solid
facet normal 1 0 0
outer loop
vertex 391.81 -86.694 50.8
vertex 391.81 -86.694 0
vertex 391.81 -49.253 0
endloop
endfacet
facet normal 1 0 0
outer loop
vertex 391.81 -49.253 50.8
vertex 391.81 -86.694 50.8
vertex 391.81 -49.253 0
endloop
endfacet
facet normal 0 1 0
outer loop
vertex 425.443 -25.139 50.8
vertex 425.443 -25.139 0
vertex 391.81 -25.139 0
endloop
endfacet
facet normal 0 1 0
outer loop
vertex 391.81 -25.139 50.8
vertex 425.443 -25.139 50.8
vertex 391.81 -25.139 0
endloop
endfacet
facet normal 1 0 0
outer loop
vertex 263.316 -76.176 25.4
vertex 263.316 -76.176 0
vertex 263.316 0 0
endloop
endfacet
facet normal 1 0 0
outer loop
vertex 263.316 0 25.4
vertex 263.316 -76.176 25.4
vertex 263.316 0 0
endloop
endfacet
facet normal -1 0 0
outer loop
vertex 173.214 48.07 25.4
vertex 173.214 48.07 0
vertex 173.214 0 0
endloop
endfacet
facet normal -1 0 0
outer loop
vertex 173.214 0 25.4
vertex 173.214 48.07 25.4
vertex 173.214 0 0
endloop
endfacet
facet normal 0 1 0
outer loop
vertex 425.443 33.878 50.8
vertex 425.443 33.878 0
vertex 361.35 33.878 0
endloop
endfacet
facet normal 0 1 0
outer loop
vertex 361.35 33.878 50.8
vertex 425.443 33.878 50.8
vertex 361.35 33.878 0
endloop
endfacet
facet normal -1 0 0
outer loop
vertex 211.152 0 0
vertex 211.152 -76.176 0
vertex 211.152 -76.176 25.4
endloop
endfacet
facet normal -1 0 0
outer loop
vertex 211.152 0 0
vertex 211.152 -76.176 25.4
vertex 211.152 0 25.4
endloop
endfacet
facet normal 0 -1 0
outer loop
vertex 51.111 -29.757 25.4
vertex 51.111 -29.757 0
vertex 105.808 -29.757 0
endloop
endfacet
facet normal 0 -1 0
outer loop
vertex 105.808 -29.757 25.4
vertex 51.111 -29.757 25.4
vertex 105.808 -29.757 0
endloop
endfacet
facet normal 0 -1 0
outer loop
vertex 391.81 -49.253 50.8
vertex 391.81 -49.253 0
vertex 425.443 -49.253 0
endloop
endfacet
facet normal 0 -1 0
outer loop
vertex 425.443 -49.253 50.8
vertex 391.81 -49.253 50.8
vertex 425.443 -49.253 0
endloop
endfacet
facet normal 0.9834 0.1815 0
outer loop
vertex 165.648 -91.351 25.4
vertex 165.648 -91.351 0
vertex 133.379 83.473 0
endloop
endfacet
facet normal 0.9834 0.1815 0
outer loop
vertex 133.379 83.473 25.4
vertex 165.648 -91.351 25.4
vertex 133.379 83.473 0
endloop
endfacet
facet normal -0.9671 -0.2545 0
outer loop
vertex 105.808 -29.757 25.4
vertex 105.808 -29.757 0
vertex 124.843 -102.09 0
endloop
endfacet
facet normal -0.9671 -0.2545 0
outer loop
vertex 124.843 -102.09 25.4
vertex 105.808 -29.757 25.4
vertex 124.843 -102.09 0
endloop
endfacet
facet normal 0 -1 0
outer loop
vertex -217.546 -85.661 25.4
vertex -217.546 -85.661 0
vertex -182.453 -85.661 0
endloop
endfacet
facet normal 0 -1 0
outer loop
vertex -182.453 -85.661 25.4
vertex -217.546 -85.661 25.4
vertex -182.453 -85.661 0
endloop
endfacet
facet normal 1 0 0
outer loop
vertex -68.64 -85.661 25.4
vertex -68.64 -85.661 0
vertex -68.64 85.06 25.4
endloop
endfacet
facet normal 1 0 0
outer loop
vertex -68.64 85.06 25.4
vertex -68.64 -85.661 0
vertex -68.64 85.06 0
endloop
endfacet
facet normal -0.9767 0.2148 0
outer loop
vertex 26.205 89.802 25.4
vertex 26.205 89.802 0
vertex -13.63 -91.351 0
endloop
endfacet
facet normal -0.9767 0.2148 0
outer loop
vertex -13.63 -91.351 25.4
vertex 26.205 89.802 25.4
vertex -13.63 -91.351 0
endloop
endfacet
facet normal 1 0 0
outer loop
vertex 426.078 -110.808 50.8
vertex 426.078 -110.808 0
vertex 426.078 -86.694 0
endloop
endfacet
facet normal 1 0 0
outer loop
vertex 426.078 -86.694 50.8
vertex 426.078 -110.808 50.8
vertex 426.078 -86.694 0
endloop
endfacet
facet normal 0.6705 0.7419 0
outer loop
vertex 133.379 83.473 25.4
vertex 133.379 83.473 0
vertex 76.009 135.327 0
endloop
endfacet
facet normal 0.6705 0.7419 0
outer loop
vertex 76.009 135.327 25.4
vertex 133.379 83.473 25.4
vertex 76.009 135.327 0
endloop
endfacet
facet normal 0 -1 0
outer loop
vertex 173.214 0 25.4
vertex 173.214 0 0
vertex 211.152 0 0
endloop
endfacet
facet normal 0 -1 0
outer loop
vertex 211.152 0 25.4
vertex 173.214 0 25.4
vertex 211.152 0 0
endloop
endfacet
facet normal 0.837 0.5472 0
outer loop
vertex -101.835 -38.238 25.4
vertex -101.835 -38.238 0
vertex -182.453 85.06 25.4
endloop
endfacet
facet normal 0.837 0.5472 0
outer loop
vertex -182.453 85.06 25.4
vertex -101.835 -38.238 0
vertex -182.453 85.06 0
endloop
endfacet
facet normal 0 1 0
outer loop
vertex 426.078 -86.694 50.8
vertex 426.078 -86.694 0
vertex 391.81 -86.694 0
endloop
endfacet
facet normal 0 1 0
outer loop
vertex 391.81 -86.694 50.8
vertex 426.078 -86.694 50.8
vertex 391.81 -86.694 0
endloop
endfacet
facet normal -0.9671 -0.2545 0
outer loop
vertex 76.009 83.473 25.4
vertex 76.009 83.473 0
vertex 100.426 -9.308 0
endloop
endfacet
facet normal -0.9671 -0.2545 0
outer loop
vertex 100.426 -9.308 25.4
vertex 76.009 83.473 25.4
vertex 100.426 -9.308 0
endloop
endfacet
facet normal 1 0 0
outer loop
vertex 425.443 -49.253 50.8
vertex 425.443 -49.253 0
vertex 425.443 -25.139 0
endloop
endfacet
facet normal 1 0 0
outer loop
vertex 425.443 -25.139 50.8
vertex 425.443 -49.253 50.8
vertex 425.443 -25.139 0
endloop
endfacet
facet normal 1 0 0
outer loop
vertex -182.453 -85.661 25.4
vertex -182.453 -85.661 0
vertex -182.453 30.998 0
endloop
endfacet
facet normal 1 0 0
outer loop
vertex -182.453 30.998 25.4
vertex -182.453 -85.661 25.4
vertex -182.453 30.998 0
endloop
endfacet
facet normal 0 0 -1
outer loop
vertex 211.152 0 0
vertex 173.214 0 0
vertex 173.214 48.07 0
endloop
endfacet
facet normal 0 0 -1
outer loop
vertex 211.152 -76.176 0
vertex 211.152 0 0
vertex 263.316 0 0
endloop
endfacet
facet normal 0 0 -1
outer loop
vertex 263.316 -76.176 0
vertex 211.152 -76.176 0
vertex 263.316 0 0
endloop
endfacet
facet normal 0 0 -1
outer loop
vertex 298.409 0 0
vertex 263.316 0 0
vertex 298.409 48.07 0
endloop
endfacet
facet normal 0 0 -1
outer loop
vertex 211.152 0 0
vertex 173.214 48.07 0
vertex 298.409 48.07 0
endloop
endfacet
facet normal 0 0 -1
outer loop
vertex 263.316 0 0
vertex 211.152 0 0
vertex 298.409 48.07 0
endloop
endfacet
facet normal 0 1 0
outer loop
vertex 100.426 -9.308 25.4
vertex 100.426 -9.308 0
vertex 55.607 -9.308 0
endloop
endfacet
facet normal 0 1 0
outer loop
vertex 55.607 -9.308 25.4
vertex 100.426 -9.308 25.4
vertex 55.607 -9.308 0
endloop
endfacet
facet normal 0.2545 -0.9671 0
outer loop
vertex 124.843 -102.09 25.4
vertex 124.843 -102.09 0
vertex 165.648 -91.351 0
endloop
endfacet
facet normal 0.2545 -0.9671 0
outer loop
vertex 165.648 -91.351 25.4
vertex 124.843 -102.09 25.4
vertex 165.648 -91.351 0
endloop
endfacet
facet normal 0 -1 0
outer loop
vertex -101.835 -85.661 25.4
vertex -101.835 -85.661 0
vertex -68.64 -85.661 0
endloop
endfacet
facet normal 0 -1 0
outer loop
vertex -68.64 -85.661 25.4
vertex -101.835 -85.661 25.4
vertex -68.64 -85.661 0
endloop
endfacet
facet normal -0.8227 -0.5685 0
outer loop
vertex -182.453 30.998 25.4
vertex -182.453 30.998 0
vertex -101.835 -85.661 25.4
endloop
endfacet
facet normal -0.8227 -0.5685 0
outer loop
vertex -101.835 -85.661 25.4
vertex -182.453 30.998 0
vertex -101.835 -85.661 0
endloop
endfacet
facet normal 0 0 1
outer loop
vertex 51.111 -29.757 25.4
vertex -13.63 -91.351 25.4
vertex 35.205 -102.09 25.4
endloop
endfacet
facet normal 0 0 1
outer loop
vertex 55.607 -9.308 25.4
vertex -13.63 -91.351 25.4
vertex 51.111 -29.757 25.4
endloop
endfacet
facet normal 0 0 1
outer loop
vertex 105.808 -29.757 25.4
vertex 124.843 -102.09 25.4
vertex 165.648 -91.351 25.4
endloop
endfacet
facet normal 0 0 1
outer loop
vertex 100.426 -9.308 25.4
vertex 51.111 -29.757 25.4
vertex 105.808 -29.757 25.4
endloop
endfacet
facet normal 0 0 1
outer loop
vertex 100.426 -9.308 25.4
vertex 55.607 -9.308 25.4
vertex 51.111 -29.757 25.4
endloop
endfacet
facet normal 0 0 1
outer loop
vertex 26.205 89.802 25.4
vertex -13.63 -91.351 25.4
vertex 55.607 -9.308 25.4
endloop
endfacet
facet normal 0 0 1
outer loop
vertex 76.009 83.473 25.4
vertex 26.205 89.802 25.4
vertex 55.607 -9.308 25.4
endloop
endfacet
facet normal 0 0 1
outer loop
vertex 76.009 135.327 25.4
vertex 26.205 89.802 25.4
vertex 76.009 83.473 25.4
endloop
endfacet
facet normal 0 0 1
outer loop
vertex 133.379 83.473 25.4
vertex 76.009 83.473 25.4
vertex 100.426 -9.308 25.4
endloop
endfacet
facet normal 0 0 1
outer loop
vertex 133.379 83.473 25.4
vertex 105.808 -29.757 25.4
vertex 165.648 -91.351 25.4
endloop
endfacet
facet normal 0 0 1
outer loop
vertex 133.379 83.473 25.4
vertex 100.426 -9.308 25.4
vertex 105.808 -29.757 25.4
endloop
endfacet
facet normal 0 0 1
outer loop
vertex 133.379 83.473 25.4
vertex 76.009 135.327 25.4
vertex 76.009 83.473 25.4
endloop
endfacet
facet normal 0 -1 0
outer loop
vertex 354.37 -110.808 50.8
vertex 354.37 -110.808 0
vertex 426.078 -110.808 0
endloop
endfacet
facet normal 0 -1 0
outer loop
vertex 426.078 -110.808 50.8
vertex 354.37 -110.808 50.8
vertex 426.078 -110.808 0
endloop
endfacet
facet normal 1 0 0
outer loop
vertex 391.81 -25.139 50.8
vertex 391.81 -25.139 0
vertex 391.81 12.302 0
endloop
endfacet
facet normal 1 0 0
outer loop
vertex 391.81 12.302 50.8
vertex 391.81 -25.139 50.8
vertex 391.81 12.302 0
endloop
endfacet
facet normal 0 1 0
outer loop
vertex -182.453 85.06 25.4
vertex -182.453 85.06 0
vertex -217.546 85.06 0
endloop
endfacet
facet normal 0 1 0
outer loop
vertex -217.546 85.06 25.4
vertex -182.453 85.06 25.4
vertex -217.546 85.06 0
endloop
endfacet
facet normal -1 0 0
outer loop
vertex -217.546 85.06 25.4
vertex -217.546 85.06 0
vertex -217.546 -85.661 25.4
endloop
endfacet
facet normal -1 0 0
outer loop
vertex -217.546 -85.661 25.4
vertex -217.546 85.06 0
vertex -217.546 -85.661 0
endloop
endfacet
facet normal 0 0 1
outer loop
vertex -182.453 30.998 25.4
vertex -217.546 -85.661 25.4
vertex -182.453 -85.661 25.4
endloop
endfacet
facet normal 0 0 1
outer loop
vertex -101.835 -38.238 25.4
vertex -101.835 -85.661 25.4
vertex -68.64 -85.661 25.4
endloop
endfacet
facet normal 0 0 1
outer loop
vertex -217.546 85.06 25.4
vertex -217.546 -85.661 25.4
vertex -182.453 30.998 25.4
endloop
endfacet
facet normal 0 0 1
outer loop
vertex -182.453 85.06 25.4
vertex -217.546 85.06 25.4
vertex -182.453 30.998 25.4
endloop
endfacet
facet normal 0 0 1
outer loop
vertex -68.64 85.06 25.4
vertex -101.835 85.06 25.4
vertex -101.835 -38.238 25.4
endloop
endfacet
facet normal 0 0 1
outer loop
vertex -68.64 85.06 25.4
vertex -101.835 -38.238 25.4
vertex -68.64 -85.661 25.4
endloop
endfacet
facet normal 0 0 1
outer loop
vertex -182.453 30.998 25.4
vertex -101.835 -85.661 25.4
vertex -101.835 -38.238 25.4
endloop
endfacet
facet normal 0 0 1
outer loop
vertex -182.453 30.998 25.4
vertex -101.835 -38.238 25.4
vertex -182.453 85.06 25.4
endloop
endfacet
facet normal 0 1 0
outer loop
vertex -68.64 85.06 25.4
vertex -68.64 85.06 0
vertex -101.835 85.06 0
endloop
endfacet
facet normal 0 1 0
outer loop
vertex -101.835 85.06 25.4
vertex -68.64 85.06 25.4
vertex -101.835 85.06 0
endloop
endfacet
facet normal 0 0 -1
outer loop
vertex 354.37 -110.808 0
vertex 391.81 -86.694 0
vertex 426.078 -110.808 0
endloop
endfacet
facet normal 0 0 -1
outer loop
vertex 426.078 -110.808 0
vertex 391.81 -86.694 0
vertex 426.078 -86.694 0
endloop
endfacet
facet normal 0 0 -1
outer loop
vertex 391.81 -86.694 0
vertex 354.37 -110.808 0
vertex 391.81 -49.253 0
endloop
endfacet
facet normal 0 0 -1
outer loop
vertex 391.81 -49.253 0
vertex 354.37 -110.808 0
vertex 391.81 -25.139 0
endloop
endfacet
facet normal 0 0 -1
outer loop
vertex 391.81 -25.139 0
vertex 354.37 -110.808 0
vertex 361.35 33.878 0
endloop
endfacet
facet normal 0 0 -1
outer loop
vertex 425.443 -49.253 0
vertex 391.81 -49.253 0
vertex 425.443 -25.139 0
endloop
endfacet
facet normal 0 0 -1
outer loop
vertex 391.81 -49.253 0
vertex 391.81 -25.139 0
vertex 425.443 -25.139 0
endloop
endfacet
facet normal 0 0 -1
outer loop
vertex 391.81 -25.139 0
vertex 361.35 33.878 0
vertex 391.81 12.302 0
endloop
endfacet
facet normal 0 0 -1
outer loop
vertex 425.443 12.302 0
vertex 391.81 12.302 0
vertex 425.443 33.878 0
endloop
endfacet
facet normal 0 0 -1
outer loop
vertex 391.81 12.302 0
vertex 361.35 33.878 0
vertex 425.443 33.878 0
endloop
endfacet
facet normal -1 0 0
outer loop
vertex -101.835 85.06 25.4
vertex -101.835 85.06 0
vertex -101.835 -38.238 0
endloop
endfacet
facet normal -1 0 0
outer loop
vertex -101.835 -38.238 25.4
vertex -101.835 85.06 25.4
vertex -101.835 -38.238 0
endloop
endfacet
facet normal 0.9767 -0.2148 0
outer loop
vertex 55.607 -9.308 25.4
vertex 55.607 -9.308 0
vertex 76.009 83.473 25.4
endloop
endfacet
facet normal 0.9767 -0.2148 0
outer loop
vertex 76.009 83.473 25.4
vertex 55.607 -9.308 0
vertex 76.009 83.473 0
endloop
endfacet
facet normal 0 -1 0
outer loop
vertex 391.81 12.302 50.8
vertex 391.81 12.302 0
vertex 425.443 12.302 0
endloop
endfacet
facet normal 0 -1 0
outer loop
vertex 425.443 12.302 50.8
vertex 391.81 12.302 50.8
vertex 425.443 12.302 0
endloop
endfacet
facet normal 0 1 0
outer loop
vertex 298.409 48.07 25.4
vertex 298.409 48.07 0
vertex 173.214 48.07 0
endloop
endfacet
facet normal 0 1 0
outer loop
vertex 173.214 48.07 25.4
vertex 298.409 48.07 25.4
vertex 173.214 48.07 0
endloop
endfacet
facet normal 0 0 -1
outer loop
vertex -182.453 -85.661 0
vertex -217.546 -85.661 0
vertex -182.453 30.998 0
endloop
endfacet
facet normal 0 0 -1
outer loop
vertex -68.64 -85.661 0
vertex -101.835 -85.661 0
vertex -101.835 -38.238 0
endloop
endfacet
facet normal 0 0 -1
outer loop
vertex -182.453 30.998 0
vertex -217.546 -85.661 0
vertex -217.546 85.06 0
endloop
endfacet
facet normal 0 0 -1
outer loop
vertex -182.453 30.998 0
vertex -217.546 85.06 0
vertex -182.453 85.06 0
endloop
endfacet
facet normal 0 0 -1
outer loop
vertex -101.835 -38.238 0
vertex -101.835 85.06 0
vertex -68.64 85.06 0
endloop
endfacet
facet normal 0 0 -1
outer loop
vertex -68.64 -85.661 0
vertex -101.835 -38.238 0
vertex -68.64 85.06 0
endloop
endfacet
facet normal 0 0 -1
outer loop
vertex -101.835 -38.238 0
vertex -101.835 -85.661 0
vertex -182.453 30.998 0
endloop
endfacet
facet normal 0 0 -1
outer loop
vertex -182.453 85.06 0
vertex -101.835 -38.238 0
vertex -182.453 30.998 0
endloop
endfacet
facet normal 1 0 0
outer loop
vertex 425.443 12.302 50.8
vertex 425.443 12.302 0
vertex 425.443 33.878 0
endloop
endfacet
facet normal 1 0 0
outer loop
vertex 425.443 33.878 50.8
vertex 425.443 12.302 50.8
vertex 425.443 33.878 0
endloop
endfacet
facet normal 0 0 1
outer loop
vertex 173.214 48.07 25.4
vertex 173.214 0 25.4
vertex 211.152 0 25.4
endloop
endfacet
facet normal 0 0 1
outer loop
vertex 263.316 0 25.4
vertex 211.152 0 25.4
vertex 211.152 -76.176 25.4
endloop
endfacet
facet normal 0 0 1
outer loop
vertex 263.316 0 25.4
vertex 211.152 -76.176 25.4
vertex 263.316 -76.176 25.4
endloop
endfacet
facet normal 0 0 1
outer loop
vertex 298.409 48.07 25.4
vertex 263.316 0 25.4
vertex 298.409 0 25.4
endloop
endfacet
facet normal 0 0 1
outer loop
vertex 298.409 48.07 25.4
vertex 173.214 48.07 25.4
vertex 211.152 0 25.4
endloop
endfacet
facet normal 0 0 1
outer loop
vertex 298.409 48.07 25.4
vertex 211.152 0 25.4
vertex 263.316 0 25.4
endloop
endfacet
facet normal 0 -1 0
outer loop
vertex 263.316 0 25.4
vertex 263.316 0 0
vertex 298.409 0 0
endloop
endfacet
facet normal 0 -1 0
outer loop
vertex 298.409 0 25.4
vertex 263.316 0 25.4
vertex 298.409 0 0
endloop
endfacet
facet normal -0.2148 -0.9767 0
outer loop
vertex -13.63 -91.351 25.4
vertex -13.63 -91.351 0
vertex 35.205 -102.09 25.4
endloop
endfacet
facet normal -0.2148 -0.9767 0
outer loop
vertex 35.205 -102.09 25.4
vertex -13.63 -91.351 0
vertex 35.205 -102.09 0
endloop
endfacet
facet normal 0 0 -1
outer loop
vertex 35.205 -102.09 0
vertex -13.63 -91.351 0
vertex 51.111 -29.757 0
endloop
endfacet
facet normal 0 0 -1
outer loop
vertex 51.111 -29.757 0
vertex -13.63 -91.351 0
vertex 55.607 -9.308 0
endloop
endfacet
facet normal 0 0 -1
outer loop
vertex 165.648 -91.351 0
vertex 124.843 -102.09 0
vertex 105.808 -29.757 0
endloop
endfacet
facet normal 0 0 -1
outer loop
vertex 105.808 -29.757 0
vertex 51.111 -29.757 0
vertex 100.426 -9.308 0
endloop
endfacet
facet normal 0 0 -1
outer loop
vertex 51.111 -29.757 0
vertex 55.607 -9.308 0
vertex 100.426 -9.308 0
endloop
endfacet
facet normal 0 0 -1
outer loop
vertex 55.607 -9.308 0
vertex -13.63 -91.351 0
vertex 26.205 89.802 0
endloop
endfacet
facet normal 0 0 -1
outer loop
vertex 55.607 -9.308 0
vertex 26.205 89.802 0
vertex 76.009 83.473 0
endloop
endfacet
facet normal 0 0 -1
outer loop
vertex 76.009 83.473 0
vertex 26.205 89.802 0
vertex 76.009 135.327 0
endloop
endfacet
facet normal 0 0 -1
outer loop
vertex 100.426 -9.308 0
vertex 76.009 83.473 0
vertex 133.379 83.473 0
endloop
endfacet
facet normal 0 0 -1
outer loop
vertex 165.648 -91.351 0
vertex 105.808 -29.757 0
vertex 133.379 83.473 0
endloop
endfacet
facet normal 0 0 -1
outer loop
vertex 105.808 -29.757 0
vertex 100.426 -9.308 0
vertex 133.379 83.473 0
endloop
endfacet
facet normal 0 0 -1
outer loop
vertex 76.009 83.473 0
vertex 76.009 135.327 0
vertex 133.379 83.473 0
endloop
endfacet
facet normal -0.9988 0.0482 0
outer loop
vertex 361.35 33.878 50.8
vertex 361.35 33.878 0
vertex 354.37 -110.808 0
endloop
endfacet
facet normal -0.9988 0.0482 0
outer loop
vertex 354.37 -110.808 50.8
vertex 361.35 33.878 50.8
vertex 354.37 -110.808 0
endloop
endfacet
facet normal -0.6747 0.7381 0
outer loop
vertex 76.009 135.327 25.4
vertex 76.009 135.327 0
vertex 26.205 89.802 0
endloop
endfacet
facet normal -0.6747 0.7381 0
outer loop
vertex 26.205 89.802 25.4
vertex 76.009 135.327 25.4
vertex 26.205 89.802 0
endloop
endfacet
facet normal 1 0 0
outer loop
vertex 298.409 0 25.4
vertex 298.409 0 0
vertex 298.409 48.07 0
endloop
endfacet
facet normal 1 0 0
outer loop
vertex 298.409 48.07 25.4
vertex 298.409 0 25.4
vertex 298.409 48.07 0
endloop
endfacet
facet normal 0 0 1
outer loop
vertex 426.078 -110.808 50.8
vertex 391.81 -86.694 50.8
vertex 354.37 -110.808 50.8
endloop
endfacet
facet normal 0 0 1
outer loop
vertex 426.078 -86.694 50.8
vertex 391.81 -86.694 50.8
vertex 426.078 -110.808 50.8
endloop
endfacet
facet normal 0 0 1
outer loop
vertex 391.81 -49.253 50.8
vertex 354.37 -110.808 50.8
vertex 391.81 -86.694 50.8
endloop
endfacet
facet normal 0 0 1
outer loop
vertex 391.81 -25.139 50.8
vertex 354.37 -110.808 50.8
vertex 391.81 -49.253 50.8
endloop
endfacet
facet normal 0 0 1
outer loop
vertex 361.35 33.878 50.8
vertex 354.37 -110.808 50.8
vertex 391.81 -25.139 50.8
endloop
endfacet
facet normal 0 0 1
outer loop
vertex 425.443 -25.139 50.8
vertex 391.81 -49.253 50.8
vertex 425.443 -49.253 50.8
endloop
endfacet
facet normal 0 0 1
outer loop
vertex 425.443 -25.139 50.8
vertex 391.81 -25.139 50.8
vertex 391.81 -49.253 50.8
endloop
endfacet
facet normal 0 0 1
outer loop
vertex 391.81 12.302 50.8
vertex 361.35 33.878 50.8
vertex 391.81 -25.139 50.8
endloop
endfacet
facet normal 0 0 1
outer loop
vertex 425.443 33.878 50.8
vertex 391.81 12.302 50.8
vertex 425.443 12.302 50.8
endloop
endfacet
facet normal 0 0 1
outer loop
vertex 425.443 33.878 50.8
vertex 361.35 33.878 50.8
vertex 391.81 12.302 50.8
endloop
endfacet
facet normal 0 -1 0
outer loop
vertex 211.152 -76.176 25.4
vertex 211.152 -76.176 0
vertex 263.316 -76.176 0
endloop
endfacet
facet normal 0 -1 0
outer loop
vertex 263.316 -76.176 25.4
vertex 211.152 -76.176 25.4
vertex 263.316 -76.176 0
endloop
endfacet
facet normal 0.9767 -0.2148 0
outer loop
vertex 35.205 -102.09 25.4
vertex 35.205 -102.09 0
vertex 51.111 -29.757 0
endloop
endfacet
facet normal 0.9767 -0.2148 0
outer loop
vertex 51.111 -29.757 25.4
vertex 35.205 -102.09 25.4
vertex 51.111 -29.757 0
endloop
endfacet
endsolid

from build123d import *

# Parameters (mm, degrees)
F1_DEPTH  = 25.4
F0_W      = 52.1645247936
F0_H      = 76.1762037873
F0_W_2    = 114.7619485855
F0_H_2    = 76.8241360784
F3_DEPTH  = 50.8
F4_W      = 31.2986969948
F4_H      = 23.7111561
F5_DEPTH  = 50.8
F6_DEPTH  = 25.4
F7_DEPTH  = 25.4
F8_DEPTH  = 25.4
F9_DEPTH  = 25.4
F10_DEPTH = 25.4
F12_DEPTH = 50.8


with BuildPart() as f1:
    # F0 (on Top) → F1 (new body)
    with BuildSketch(Plane.XY):
        Polygon((-182.453379035, 85.0596278906), (-217.5458818674, 85.0596278906), (-217.5458818674, -85.6606662273), (-182.453379035, -85.6606662273), (-182.453379035, 30.998211354), align=None)
        Polygon((-101.8354520202, -38.2383577526), (-182.453379035, 85.0596278906), (-182.453379035, 30.998211354), (-101.8354520202, -85.6606662273), align=None)
        Polygon((-101.8354520202, 85.0596502423), (-101.8354520202, -38.2383577526), (-101.8354520202, -85.6606662273), (-68.639844656, -85.6606662273), (-68.639844656, 85.0596502423), align=None)
    extrude(amount=F1_DEPTH)


with BuildPart() as f1b:
    # F0 (on Top) → F1, piece 2 (new body)
    with BuildSketch(Plane.XY):
        Polygon((76.009353229, 135.3272944689), (26.2047741562, 89.8018702865), (-13.6299645528, -91.3513377309), (35.2049136263, -102.0898978339), (51.1106868903, -29.7565037626), (55.6071334276, -9.3083788014), (76.009353229, 83.4731402312), (100.426262979, -9.3083788014), (105.807507293, -29.7565037626), (124.843172729, -102.0898978339), (165.6484969401, -91.3513377309), (133.3791911602, 83.4731402312), align=None)
        Polygon((55.6071334276, -9.3083788014), (51.1106868903, -29.7565037626), (105.807507293, -29.7565037626), (100.426262979, -9.3083788014), align=None)
    extrude(amount=F1_DEPTH)


with BuildPart() as f1c:
    # F0 (on Top) → F1, piece 3 (new body)
    with BuildSketch(Plane.XY):
        with Locations((237.2340410948, -38.0881018937)):
            Rectangle(F0_W, F0_H)
        Polygon((173.2139289379, 0), (211.151778698, 0), (263.3163034916, 0), (298.408806324, 0), (298.408806324, 48.0702407658), (213.9971107244, 48.0702407658), (173.2139289379, 48.0702407658), align=None)
    extrude(amount=F1_DEPTH)


with BuildPart() as f1d:
    # F0 (on Top) → F1, piece 4 (new body)
    with BuildSketch(Plane.XY):
        with Locations((428.8201630116, 76.9978500903)):
            Rectangle(F0_W_2, F0_H_2)
    extrude(amount=F1_DEPTH)

    # F4 (on face) → F5 (cut)
    with BuildSketch(Plane.XY.offset(25.4)):
        with Locations((433.5623979568, 72.2556207329)):
            Rectangle(F4_W, F4_H)
    extrude(amount=-F5_DEPTH, mode=Mode.SUBTRACT)

    # F10 (cut): a face of the model
    f10_faces = [f1d.faces().sort_by_distance(p)[0] for p in [
        (372.820211989, 76.9978500903, 25.4),
    ]]
    extrude(f10_faces, amount=-F10_DEPTH, mode=Mode.SUBTRACT)


with BuildPart() as f3:
    # F2 (on face) → F3 (new body)
    with BuildSketch(Plane.XY.offset(25.4)):
        Polygon((395.150333643, 38.5857820511), (371.4391887188, 38.5857820511), (371.4391887188, -18.3209888637), (487.1495962143, -18.3209888637), (487.1495962143, 0), (395.150333643, 0), align=None)
    extrude(amount=F3_DEPTH)

    # F6 (cut): a face of the model
    f6_faces = [f3.faces().sort_by_distance(p)[0] for p in [
        (383.2947611809, 38.5857820511, 50.8),
    ]]
    extrude(f6_faces, amount=-F6_DEPTH, mode=Mode.SUBTRACT)

    # F7 (cut): a face of the model
    f7_faces = [f3.faces().sort_by_distance(p)[0] for p in [
        (383.2947611809, 13.1857820511, 50.8),
    ]]
    extrude(f7_faces, amount=-F7_DEPTH, mode=Mode.SUBTRACT)

    # F8 (cut): a face of the model
    f8_faces = [f3.faces().sort_by_distance(p)[0] for p in [
        (441.1499649286, 0, 50.8),
    ]]
    extrude(f8_faces, amount=-F8_DEPTH, mode=Mode.SUBTRACT)

    # F9 (cut): a face of the model
    f9_faces = [f3.faces().sort_by_distance(p)[0] for p in [
        (383.2947611809, -12.2142179489, 50.8),
    ]]
    extrude(f9_faces, amount=-F9_DEPTH, mode=Mode.SUBTRACT)


with BuildPart() as f12:
    # F11 (on Top) → F12 (new body)
    with BuildSketch(Plane.XY):
        Polygon((425.4434108734, 33.8778495789), (361.3499701023, 33.8778495789), (354.3695211411, -110.8083352447), (426.077991724, -110.8083352447), (426.077991724, -86.6939723492), (391.810208559, -86.6939723492), (391.810208559, -49.2532514036), (425.4434108734, -49.2532514036), (425.4434108734, -25.1388847828), (391.810208559, -25.1388847828), (391.810208559, 12.3018408194), (425.4434108734, 12.3018408194), align=None)
    extrude(amount=F12_DEPTH)


solid = Compound([f1.part, f1b.part, f1c.part, f12.part])
